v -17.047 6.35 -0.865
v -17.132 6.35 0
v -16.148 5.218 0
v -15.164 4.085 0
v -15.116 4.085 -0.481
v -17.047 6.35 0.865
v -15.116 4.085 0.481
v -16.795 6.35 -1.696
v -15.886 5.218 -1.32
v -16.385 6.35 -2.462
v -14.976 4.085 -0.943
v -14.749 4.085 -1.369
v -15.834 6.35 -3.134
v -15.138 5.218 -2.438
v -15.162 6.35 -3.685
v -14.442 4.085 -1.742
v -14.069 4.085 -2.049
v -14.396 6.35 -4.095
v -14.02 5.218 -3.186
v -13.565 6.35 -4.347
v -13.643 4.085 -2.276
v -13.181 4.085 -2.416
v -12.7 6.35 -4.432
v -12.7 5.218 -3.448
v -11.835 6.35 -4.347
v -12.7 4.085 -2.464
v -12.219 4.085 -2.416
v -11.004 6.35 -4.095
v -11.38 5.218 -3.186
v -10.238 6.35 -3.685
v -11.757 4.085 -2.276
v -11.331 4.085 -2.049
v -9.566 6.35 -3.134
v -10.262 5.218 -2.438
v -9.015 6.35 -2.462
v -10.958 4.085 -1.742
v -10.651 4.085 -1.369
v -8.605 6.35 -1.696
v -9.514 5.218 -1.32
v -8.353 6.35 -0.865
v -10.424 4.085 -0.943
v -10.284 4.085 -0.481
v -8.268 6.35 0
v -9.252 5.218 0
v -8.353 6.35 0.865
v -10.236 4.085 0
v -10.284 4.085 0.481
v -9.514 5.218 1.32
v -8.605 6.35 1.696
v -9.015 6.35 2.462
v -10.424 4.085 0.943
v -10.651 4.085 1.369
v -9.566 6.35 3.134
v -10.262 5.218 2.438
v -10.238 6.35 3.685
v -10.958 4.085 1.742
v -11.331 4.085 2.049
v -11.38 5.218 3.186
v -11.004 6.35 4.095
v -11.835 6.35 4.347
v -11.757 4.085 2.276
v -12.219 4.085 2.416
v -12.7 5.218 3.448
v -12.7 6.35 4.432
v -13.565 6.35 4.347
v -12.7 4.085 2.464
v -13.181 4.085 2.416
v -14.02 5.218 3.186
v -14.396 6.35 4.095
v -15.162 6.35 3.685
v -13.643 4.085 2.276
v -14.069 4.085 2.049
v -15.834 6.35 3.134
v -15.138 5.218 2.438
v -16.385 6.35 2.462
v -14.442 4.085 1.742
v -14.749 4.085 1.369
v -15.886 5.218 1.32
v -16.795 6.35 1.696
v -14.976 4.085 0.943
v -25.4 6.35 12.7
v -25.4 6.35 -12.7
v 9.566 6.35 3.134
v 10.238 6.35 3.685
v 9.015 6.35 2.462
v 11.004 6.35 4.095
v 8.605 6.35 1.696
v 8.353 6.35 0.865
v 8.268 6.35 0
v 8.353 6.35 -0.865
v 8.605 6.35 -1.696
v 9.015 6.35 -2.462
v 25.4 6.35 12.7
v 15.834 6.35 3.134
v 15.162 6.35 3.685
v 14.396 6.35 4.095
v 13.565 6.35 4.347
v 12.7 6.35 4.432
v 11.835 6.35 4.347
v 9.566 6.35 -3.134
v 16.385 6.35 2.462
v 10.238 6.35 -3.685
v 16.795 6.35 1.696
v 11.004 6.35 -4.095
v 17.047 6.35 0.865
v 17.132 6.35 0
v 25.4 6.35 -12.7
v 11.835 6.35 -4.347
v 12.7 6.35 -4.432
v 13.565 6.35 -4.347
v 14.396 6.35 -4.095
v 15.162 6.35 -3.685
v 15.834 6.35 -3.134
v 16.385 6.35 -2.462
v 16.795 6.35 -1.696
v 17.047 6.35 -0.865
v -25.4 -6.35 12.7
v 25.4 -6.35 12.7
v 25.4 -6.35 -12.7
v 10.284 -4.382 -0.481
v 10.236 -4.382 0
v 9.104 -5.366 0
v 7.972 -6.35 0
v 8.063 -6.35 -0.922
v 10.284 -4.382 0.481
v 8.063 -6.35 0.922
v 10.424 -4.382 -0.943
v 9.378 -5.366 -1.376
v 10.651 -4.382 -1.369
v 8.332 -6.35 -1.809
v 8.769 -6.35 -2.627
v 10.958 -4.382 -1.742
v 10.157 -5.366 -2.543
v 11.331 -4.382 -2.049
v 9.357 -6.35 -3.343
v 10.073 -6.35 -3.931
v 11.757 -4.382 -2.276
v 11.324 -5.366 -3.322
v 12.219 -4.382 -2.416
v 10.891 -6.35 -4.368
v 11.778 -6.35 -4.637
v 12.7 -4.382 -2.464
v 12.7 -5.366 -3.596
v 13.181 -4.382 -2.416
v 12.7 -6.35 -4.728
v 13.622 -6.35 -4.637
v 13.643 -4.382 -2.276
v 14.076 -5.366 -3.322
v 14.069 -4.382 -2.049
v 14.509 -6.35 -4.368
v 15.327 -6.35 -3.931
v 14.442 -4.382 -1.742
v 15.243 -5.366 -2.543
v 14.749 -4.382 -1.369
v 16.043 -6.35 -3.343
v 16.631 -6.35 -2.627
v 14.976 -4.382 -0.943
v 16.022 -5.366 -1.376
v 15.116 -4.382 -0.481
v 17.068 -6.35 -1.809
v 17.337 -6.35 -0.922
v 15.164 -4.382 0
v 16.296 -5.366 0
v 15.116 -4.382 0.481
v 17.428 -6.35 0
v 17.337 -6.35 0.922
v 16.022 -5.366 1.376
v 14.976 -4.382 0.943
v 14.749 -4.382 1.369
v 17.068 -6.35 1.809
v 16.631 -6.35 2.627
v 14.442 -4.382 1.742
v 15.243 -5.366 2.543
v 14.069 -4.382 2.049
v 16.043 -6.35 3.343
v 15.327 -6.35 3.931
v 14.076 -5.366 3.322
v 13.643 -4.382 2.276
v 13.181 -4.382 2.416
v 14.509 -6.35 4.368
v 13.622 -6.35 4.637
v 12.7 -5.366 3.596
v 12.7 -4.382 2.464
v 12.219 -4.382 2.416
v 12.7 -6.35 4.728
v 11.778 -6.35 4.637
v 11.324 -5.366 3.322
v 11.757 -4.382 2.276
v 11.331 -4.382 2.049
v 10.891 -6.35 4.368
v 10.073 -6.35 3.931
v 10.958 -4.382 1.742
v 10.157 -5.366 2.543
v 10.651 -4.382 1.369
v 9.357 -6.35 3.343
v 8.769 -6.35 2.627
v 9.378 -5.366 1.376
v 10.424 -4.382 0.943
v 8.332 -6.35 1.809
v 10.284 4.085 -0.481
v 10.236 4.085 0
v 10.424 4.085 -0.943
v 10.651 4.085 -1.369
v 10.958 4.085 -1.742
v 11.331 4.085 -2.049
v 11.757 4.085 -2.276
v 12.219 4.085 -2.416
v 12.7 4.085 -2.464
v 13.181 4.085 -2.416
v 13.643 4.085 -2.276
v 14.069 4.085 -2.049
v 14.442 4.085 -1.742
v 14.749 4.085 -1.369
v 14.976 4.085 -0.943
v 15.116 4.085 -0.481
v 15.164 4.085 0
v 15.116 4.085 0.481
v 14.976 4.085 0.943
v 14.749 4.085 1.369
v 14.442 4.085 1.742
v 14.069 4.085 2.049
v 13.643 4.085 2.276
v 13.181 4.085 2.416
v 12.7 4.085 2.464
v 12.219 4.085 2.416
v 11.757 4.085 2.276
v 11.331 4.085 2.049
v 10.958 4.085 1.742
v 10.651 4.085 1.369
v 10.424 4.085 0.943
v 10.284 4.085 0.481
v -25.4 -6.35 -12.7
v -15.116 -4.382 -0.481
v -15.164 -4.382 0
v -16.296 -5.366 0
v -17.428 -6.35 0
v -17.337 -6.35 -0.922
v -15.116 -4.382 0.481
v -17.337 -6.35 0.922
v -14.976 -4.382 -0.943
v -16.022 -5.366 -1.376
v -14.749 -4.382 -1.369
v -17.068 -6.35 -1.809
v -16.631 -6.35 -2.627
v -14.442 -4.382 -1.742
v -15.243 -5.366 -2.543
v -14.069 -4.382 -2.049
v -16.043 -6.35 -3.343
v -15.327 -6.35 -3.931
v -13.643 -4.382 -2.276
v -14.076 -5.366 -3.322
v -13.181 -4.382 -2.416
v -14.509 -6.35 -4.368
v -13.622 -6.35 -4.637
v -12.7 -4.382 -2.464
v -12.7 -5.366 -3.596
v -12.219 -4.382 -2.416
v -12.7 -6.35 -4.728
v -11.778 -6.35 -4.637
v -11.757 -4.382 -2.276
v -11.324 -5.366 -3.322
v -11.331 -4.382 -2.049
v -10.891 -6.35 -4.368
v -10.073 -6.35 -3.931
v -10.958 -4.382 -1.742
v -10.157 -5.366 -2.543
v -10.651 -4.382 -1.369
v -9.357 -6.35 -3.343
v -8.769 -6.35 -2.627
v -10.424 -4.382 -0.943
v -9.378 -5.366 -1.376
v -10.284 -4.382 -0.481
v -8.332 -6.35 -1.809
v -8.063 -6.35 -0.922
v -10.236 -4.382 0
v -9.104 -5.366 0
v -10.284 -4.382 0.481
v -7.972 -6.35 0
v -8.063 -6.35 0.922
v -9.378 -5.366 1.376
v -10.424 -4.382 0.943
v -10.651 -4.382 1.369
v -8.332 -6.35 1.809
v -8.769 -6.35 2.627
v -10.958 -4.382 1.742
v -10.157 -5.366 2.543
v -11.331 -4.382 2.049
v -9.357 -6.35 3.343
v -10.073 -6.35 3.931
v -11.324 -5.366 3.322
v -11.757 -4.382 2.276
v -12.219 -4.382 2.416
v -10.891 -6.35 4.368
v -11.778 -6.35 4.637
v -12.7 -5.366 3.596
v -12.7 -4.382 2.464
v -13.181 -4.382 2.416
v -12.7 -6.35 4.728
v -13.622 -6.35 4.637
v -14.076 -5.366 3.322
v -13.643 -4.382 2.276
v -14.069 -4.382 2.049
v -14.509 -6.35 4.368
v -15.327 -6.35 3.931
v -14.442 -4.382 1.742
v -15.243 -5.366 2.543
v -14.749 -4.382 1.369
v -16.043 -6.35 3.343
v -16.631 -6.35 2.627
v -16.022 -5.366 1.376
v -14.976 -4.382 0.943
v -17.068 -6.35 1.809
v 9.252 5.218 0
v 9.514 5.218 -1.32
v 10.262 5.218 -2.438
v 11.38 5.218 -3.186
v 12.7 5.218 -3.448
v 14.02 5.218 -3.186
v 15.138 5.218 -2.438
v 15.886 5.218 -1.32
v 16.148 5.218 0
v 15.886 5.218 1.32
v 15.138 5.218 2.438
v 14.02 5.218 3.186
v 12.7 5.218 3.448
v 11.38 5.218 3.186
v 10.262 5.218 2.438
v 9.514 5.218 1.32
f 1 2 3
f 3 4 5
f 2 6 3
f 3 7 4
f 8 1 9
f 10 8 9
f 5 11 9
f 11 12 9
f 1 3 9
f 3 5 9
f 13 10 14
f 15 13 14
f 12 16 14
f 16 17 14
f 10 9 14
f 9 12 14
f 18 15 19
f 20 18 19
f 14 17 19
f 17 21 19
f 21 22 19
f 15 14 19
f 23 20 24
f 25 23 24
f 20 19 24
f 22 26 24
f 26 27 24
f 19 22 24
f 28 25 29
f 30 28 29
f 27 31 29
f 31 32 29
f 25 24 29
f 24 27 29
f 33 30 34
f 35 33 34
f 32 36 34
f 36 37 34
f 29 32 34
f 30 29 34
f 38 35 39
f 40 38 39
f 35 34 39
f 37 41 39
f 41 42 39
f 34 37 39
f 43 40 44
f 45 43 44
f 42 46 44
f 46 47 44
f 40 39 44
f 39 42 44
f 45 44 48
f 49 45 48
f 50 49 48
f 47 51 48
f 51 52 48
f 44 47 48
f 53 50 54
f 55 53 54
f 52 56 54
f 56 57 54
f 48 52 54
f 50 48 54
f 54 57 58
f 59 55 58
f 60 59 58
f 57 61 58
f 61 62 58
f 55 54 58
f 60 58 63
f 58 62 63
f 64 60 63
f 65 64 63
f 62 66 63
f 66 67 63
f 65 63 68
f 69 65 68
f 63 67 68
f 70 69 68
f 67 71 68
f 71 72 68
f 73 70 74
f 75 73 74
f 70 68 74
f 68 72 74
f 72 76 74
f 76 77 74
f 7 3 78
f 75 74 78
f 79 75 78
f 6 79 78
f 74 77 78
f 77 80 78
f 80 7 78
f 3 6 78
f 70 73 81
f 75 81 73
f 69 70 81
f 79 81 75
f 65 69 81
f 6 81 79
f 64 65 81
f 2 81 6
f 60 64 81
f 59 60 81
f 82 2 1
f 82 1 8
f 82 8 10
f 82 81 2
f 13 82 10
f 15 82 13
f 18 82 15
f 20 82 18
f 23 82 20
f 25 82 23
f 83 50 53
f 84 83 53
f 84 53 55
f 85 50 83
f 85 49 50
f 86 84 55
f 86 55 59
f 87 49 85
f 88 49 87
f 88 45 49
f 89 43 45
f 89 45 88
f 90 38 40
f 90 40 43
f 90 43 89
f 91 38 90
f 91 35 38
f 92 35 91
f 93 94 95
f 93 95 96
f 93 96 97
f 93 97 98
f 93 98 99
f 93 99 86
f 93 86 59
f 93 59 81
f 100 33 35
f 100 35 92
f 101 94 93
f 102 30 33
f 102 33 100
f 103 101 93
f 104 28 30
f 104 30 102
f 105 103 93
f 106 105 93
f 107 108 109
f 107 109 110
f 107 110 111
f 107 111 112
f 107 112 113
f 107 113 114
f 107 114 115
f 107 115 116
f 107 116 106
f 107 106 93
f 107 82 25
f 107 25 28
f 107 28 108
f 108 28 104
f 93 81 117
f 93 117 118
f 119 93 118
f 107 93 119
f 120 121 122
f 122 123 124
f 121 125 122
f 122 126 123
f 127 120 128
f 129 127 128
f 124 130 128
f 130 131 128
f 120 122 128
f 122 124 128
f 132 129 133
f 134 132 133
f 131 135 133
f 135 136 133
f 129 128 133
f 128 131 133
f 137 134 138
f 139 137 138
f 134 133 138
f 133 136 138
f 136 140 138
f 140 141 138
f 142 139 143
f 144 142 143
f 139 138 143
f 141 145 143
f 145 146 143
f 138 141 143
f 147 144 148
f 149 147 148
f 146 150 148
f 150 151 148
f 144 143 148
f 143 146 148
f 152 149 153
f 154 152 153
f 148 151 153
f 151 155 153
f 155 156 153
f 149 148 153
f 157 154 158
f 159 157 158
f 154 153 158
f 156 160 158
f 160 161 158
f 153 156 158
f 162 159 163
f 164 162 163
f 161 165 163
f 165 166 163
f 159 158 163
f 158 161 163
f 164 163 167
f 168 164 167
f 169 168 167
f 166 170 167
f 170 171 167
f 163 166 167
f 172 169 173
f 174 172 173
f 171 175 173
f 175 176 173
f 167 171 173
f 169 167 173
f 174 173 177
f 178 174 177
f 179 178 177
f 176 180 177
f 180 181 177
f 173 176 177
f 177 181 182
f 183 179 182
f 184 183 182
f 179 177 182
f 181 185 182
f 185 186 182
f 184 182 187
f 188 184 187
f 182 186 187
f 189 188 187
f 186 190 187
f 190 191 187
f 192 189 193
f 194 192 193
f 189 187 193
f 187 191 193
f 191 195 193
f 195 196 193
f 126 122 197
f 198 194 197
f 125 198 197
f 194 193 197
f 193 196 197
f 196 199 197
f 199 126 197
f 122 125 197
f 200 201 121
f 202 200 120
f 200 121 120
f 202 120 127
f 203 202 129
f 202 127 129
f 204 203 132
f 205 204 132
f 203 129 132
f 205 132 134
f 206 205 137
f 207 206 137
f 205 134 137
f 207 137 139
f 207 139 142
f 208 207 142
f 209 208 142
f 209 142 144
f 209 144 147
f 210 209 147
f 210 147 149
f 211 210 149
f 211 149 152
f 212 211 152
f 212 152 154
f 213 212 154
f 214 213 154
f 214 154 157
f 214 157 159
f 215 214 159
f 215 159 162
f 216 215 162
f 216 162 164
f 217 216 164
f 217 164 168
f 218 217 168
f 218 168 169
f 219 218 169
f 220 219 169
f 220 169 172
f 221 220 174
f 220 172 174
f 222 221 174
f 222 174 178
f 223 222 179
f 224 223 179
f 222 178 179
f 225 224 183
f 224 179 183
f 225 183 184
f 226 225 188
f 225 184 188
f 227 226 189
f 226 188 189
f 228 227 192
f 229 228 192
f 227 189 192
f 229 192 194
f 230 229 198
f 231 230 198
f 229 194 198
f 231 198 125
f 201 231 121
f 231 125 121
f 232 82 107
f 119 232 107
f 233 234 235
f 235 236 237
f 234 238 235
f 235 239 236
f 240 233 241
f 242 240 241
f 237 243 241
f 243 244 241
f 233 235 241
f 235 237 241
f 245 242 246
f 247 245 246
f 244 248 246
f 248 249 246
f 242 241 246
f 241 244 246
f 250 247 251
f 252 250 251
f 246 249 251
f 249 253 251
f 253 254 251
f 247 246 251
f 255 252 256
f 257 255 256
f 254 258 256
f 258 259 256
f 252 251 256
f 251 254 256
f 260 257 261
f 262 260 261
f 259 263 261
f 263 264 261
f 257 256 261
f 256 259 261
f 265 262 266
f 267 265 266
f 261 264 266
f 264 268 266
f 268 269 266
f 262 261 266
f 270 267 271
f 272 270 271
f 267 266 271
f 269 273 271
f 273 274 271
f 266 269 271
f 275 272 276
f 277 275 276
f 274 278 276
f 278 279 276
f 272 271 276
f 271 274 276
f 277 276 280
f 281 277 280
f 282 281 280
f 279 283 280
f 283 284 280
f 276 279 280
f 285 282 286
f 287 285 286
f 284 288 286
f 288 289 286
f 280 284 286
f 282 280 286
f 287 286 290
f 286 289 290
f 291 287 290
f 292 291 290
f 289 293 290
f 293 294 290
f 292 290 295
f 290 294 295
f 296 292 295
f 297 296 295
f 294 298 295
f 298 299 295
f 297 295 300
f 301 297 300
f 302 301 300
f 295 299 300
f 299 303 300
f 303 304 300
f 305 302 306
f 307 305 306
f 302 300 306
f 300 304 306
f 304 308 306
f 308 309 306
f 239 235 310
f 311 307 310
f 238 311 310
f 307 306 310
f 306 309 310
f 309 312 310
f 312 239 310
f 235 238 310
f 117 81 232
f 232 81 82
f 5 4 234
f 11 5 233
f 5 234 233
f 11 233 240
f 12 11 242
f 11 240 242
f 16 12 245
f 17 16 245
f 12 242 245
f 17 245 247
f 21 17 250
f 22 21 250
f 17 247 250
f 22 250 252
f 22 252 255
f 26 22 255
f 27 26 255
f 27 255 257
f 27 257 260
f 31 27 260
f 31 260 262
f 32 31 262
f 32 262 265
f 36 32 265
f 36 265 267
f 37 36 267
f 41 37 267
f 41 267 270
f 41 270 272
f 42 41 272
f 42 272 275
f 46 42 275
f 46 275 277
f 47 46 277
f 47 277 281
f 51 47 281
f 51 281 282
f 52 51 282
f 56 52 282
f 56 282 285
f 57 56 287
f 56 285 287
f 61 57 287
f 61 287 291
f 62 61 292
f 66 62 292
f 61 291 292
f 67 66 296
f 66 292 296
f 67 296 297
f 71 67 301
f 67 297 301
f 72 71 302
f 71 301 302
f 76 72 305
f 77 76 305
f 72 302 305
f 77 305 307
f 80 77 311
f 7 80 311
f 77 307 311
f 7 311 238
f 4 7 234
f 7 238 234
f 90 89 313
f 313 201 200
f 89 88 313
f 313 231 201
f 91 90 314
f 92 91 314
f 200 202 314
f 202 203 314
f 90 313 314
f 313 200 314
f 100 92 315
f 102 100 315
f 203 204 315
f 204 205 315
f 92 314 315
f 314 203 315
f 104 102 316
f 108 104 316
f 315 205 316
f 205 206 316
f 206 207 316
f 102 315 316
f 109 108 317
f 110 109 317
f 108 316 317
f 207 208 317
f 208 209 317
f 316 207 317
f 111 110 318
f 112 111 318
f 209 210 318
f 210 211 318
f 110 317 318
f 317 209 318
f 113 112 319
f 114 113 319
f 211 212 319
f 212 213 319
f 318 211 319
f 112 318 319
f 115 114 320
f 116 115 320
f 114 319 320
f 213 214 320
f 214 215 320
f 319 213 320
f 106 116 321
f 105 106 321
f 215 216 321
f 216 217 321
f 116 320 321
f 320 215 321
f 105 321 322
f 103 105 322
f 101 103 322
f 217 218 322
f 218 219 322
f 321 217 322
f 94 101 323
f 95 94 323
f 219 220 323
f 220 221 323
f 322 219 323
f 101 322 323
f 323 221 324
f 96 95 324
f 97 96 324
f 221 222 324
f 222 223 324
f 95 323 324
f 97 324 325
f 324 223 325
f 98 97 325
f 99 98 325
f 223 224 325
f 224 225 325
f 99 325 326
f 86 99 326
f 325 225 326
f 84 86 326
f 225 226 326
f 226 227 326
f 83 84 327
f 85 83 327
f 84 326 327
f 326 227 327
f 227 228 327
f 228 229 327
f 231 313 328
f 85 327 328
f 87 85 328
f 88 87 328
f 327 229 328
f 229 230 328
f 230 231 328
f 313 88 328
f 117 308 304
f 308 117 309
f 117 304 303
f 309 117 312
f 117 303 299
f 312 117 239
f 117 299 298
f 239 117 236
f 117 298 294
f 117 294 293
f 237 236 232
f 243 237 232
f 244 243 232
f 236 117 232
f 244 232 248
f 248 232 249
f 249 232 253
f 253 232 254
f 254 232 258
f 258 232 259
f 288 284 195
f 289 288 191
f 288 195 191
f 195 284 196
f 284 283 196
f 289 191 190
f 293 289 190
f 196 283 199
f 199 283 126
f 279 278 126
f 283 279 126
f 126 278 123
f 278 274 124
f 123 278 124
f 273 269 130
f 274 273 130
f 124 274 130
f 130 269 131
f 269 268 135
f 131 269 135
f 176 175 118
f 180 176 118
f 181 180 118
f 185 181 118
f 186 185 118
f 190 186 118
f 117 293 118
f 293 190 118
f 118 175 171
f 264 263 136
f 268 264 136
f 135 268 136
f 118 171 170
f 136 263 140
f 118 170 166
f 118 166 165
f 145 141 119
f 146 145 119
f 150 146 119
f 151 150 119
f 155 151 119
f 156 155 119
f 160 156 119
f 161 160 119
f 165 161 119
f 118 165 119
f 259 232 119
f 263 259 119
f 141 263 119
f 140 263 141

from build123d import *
from OCP.BRepFilletAPI import BRepFilletAPI_MakeChamfer

# Parameters (mm, degrees)
SKETCH1_W           = 50.8
SKETCH1_H           = 25.4
BOSS_EXTRUDE1_DEPTH = 12.7
HOLE1_D             = 4.9276
CHAMFER1_SIZE       = 1.9685
CHAMFER1_SIZE2      = 2.264500221


with BuildPart() as part:
    # Sketch1 → Boss-Extrude1 (new body)
    with BuildSketch(Plane(origin=(0, 6.35, 0), x_dir=(1, 0, 0), z_dir=(0, 1, 0))):
        Rectangle(SKETCH1_W, SKETCH1_H)
    extrude(amount=-BOSS_EXTRUDE1_DEPTH)

    # Hole1 (through all)
    with Locations(Plane(origin=(0, 6.35, 0), x_dir=(1, 0, 0), z_dir=(0, 1, 0))):
        with Locations((-12.7, 0), (12.7, 0)):
            Hole(HOLE1_D / 2)

    # Chamfer1: one chamfer whose edges measure the first distance from different faces: ONE call of the kernel's chamfer builder (chamfer() names one face for all edges)
    chamfer1_edges_1 = [part.edges().sort_by_distance(p)[0] for p in [
        (15.1638, 6.35, 0),
        (-10.2362, 6.35, 0),
    ]]
    chamfer1_side_1 = [part.faces().sort_by_distance(p)[0] for p in [
        (0, 6.35, 0),
    ]]
    chamfer1_edges_2 = [part.edges().sort_by_distance(p)[0] for p in [
        (15.1638, -6.35, 0),
    ]]
    chamfer1_side_2 = [part.faces().sort_by_distance(p)[0] for p in [
        (15.1638, 0, 0),
    ]]
    chamfer1_edges_3 = [part.edges().sort_by_distance(p)[0] for p in [
        (-10.2362, -6.35, 0),
    ]]
    chamfer1_side_3 = [part.faces().sort_by_distance(p)[0] for p in [
        (-10.2362, 0, 0),
    ]]
    chamfer1 = BRepFilletAPI_MakeChamfer(part.part.solid().wrapped)
    for e in chamfer1_edges_1:
        chamfer1.Add(CHAMFER1_SIZE, CHAMFER1_SIZE2, e.wrapped, chamfer1_side_1[0].wrapped)  # the first distance lies on this face
    for e in chamfer1_edges_2:
        chamfer1.Add(CHAMFER1_SIZE, CHAMFER1_SIZE2, e.wrapped, chamfer1_side_2[0].wrapped)  # the first distance lies on this face
    for e in chamfer1_edges_3:
        chamfer1.Add(CHAMFER1_SIZE, CHAMFER1_SIZE2, e.wrapped, chamfer1_side_3[0].wrapped)  # the first distance lies on this face
    add(Compound.cast(chamfer1.Shape()), mode=Mode.REPLACE)


solid = part.part
